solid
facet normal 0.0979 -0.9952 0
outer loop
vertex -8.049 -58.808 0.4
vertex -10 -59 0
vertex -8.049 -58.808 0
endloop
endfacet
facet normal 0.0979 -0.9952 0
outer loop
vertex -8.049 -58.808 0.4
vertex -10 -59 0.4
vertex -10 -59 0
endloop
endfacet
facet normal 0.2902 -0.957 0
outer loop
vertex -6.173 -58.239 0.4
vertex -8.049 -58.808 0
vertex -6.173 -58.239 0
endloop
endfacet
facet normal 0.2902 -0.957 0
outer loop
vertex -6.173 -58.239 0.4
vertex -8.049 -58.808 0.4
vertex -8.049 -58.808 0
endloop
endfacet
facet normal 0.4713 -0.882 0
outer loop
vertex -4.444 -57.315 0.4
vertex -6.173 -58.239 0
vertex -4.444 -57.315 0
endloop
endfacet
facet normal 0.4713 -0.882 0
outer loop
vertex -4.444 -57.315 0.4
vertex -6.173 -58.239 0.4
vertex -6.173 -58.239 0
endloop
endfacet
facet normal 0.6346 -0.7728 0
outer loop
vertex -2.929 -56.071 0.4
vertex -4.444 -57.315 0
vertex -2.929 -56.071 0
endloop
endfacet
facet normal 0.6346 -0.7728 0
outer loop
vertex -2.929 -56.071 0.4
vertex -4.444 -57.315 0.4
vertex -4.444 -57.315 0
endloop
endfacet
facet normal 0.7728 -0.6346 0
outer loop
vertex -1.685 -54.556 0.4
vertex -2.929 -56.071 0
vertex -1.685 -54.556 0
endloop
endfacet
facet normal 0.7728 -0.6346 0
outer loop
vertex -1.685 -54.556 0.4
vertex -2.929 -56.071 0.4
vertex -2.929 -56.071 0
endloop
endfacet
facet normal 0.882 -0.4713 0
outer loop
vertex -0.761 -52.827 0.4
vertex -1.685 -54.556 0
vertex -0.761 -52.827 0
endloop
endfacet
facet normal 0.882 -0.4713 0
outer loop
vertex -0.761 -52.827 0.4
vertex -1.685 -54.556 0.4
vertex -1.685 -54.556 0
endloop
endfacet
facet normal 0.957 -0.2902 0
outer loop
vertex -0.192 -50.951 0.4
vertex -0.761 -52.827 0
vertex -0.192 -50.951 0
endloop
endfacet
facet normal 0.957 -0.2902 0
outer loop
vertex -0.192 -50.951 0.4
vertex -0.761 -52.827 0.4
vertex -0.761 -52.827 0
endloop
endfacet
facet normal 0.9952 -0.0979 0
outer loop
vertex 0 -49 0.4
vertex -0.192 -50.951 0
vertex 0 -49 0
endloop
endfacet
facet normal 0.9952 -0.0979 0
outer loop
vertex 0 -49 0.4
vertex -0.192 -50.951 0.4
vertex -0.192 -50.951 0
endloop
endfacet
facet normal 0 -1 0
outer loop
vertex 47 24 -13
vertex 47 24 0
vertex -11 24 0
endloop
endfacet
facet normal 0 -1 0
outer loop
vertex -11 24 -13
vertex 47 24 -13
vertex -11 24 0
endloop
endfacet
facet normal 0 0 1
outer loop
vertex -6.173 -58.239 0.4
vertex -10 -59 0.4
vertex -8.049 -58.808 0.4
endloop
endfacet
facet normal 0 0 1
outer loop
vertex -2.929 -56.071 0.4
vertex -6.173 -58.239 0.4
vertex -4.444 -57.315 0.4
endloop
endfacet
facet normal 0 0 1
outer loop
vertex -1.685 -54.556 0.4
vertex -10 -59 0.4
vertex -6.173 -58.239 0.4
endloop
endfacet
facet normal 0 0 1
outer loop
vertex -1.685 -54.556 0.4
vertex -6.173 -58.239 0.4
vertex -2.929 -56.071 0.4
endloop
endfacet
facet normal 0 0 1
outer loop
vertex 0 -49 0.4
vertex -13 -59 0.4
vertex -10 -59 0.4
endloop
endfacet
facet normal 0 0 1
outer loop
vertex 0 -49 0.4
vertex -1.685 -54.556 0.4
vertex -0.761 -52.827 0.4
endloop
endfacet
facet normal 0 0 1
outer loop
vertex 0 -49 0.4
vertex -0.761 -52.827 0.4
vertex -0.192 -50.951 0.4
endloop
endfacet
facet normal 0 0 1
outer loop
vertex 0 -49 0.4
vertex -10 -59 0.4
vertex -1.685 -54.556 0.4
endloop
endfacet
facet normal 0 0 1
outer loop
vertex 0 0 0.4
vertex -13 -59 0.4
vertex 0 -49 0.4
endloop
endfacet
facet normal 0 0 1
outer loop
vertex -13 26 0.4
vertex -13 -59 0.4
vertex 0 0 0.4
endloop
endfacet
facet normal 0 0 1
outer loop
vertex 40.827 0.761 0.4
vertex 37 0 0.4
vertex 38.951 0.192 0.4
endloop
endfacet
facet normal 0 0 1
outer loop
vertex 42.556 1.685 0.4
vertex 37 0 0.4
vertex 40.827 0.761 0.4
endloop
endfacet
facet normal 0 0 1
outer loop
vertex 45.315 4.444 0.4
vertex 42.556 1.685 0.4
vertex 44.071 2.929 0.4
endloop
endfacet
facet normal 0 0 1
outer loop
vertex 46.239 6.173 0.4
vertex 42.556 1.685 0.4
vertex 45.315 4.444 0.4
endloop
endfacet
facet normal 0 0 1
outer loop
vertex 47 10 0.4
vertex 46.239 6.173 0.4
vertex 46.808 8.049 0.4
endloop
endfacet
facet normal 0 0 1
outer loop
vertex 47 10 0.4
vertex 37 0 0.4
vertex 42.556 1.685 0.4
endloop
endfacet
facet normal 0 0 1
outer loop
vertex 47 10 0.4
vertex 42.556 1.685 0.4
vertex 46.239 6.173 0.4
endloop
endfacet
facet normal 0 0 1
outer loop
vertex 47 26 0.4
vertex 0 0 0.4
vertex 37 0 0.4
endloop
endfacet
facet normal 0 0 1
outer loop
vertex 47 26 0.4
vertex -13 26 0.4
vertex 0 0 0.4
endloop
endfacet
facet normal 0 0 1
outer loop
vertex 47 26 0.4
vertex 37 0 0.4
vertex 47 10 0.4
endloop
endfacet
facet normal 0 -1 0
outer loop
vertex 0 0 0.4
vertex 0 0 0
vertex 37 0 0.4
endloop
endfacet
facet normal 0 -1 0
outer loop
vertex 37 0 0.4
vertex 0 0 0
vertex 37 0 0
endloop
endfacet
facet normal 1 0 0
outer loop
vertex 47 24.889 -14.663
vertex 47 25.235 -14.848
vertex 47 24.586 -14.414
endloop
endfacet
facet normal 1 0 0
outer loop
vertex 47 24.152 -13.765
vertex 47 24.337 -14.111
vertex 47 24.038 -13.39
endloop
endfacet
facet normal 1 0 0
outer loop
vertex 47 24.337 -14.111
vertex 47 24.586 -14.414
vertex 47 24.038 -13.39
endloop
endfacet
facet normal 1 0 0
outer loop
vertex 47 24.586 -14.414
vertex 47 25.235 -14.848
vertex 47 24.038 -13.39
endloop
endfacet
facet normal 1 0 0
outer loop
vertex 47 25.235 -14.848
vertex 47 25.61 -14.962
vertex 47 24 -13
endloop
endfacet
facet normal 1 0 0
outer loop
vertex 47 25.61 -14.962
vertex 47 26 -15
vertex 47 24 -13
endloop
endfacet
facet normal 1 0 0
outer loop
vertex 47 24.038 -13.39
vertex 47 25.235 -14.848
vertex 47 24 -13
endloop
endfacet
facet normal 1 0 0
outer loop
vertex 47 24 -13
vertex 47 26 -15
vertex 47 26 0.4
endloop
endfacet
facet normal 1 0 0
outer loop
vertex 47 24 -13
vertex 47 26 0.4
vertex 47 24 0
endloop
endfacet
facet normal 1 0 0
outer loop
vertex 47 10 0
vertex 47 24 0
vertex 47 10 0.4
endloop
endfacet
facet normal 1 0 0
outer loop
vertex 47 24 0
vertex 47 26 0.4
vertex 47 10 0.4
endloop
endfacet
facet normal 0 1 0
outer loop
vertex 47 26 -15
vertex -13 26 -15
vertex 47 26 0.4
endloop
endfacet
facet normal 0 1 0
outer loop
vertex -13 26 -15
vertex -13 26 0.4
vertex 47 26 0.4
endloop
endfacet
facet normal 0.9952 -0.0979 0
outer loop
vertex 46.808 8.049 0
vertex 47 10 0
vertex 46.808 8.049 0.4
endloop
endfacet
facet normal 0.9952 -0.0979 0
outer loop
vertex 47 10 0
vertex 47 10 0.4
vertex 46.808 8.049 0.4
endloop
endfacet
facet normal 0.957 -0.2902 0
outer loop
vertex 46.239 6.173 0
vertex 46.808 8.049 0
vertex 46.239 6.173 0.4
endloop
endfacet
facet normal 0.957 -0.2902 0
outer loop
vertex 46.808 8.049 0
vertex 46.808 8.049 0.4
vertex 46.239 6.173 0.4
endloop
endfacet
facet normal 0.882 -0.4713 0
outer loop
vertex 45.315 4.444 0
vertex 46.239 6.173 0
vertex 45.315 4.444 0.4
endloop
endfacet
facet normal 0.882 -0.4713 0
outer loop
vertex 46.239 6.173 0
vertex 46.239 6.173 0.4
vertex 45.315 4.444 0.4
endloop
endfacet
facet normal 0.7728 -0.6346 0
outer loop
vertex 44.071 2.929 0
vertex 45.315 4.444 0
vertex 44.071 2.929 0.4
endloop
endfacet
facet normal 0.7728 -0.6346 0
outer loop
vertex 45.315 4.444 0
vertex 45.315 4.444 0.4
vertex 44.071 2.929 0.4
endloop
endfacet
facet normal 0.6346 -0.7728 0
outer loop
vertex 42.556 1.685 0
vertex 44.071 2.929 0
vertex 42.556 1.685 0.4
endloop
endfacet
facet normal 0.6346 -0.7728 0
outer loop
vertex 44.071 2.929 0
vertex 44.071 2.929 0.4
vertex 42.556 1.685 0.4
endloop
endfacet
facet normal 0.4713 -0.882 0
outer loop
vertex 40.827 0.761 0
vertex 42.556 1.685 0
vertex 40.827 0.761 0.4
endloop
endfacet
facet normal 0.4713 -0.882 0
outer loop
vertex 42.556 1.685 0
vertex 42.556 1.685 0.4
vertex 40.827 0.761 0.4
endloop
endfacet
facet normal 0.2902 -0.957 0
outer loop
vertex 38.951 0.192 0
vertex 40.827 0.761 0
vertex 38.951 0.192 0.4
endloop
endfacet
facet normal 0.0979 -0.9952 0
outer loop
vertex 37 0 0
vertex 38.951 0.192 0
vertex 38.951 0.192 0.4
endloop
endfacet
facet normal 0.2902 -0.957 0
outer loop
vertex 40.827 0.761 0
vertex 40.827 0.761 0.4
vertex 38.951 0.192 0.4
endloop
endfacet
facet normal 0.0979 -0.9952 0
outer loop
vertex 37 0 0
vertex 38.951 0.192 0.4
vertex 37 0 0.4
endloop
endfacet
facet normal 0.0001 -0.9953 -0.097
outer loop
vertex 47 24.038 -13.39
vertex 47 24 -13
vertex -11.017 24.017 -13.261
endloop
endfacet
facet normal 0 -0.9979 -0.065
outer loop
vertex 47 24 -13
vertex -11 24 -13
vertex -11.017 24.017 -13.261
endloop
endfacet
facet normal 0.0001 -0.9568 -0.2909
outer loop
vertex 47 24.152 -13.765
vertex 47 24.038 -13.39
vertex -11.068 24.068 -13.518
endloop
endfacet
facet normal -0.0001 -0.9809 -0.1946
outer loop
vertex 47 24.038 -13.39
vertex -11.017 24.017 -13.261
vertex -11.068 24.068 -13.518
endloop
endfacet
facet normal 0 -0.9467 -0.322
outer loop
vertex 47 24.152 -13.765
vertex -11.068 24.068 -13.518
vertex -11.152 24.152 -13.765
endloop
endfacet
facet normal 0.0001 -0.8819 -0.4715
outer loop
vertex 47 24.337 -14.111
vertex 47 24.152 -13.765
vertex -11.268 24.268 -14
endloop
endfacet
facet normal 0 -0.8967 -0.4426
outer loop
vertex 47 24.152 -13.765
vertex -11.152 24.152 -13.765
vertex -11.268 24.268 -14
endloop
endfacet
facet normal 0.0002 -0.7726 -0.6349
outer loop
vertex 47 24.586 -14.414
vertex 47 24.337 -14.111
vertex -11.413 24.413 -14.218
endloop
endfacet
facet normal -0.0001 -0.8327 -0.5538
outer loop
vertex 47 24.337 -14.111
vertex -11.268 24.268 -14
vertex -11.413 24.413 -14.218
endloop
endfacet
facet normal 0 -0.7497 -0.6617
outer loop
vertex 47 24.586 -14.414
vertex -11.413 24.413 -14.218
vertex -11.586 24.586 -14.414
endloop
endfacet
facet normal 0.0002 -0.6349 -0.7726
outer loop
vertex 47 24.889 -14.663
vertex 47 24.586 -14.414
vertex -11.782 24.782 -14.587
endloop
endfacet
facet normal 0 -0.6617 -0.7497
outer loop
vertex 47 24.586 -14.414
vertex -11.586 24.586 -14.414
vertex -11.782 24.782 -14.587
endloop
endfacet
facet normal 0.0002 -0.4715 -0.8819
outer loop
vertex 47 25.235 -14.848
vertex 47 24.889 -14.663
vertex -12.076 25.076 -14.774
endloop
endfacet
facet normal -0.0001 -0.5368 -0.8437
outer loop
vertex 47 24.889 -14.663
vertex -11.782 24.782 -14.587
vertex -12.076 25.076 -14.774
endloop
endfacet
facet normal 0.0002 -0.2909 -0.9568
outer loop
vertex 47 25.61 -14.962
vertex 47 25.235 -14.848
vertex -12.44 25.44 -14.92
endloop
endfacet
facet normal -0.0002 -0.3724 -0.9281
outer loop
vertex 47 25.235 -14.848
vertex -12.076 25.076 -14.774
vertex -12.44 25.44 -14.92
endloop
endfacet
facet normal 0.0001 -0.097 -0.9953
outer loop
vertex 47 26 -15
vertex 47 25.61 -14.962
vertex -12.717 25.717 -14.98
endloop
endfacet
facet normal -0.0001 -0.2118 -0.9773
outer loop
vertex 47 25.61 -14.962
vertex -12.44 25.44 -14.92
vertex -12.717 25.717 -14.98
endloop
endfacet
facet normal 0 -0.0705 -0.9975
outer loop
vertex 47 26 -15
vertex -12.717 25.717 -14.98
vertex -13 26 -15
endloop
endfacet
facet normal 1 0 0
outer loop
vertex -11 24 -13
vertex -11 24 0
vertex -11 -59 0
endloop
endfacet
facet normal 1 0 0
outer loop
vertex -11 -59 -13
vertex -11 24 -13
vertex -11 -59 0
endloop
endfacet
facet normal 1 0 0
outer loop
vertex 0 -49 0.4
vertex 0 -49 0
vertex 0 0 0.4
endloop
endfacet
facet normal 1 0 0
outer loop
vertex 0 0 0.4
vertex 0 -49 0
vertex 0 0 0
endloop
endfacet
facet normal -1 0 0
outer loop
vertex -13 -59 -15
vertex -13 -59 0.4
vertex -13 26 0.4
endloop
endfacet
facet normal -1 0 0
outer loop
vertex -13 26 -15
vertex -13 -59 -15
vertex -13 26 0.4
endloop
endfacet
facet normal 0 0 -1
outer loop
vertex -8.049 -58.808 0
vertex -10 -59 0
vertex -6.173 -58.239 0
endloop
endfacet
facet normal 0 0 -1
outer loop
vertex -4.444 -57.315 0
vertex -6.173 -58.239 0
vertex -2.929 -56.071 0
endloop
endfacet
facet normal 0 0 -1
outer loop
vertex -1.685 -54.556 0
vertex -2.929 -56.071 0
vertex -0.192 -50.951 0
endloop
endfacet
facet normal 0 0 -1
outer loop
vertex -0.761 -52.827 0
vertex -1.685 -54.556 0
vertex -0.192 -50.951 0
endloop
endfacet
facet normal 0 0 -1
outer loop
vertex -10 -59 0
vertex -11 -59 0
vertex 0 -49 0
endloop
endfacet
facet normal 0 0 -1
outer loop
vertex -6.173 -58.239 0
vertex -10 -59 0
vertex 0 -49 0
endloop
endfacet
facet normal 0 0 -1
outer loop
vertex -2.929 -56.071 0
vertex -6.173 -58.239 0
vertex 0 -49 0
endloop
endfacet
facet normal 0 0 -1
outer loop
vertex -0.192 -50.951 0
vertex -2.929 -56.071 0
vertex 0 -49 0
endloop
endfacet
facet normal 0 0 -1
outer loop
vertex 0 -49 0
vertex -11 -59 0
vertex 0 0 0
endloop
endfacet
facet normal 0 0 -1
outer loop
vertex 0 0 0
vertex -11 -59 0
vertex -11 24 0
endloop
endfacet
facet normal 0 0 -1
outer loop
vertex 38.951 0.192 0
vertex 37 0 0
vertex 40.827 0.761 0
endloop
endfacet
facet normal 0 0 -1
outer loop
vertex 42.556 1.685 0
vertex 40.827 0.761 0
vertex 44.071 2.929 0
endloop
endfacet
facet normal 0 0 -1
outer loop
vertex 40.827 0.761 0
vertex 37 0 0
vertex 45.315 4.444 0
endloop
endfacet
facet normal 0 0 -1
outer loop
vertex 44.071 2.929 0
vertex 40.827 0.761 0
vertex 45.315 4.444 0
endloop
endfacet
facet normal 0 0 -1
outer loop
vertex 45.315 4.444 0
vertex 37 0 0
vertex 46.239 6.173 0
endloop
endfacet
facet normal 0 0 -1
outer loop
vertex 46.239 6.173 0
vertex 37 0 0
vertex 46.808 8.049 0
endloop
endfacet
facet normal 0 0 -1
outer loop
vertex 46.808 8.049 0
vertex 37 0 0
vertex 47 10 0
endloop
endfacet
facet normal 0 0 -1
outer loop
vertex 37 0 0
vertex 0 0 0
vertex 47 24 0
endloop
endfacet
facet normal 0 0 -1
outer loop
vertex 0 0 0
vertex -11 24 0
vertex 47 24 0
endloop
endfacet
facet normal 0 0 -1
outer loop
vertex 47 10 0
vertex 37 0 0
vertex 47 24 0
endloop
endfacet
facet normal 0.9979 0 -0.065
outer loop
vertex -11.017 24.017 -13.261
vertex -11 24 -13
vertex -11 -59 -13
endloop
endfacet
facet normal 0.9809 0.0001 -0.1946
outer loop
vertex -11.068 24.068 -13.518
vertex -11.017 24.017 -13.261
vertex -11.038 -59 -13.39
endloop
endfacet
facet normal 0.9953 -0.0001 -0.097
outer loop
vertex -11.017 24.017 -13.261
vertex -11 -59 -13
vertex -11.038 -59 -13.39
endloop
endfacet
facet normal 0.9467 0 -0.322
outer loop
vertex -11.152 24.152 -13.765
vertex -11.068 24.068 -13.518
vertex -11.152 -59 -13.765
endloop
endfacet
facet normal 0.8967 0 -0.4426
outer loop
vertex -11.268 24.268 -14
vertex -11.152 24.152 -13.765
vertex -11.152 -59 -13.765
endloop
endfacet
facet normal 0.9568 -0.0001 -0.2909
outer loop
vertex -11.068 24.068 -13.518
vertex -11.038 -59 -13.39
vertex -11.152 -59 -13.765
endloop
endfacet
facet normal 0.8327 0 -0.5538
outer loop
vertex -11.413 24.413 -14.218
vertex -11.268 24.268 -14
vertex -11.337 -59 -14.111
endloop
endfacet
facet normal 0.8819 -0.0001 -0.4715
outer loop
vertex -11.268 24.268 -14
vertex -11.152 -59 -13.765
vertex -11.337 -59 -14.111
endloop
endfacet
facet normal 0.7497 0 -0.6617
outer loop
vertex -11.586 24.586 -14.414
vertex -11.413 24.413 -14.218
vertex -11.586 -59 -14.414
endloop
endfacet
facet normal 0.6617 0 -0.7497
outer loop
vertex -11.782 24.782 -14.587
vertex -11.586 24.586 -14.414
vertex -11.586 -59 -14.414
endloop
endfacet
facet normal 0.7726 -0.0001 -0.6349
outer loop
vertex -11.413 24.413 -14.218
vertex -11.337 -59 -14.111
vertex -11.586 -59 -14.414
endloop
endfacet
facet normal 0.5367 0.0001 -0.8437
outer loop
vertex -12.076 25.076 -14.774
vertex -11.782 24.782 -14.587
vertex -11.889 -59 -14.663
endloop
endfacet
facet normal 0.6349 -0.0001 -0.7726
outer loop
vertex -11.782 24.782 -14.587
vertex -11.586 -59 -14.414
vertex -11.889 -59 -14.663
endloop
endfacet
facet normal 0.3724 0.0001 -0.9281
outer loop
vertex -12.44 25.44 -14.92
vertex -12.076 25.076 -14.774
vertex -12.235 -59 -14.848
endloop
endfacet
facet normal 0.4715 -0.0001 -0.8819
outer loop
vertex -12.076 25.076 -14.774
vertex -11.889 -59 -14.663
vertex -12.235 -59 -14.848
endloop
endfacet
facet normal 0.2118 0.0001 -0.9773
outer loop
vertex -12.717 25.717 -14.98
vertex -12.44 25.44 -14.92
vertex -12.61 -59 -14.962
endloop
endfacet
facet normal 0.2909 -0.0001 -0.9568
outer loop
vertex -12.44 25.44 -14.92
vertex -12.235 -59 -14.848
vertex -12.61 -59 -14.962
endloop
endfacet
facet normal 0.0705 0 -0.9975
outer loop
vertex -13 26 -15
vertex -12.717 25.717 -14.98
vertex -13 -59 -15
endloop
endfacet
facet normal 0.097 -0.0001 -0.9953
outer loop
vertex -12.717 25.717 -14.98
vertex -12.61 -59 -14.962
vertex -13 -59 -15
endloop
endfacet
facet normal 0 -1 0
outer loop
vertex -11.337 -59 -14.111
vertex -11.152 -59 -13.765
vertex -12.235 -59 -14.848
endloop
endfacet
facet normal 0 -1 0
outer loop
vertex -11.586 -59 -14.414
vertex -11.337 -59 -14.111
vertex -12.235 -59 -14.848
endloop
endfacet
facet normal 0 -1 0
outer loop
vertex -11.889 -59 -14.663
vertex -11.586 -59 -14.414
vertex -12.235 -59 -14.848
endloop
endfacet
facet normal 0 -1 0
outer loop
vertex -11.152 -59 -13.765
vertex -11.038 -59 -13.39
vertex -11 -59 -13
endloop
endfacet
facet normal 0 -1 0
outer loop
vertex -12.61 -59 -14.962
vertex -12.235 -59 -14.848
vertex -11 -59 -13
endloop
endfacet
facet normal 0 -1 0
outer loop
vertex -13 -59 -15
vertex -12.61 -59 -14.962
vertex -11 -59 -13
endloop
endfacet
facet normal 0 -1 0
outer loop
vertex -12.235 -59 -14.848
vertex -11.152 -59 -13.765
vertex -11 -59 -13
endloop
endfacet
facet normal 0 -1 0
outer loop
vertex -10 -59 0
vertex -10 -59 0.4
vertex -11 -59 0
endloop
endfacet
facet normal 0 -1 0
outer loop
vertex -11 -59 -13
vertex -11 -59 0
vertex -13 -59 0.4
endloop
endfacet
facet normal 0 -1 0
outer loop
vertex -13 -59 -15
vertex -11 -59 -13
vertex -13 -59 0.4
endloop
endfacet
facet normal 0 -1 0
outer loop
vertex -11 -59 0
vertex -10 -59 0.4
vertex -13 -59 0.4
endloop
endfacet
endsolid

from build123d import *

# Parameters (mm, degrees)
F1_DEPTH = 0.4
F3_DEPTH = 15
F4_R     = 1.99999
F5_R     = 10


# Not quite as in the source:
# - a fillet or chamfer is up to 0.001 mm smaller than in the source, because OpenCascade refuses the exact size


with BuildPart() as f1:
    # F0 (on Top) → F1 (new body)
    with BuildSketch(Plane.XY):
        Polygon((-13, -59), (0, -59), (0, 0), (47, 0), (47, 26), (-13, 26), (-13, 0), align=None)
    extrude(amount=F1_DEPTH)

    # F2 (on face) → F3 (join)
    with BuildSketch(Plane(origin=(0, 0, 0), x_dir=(1, 0, 0), z_dir=(0, 0, -1))):
        Polygon((-13, 59), (-13, -26), (-11, -26), (47, -26), (47, -24), (-11, -24), (-11, 59), align=None)
    extrude(amount=F3_DEPTH)

    # F4 (radius 2 in the source; OpenCascade refuses exactly that, so slightly less here)
    f4_edges = [f1.edges().sort_by_distance(p)[0] for p in [
        (-11, -17.5, -15),
        (18, 24, -15),
    ]]
    fillet(f4_edges, radius=F4_R)

    # F5
    f5_edges = [f1.edges().sort_by_distance(p)[0] for p in [
        (0, -59, 0.2),
        (47, 0, 0.2),
    ]]
    fillet(f5_edges, radius=F5_R)


solid = f1.part
